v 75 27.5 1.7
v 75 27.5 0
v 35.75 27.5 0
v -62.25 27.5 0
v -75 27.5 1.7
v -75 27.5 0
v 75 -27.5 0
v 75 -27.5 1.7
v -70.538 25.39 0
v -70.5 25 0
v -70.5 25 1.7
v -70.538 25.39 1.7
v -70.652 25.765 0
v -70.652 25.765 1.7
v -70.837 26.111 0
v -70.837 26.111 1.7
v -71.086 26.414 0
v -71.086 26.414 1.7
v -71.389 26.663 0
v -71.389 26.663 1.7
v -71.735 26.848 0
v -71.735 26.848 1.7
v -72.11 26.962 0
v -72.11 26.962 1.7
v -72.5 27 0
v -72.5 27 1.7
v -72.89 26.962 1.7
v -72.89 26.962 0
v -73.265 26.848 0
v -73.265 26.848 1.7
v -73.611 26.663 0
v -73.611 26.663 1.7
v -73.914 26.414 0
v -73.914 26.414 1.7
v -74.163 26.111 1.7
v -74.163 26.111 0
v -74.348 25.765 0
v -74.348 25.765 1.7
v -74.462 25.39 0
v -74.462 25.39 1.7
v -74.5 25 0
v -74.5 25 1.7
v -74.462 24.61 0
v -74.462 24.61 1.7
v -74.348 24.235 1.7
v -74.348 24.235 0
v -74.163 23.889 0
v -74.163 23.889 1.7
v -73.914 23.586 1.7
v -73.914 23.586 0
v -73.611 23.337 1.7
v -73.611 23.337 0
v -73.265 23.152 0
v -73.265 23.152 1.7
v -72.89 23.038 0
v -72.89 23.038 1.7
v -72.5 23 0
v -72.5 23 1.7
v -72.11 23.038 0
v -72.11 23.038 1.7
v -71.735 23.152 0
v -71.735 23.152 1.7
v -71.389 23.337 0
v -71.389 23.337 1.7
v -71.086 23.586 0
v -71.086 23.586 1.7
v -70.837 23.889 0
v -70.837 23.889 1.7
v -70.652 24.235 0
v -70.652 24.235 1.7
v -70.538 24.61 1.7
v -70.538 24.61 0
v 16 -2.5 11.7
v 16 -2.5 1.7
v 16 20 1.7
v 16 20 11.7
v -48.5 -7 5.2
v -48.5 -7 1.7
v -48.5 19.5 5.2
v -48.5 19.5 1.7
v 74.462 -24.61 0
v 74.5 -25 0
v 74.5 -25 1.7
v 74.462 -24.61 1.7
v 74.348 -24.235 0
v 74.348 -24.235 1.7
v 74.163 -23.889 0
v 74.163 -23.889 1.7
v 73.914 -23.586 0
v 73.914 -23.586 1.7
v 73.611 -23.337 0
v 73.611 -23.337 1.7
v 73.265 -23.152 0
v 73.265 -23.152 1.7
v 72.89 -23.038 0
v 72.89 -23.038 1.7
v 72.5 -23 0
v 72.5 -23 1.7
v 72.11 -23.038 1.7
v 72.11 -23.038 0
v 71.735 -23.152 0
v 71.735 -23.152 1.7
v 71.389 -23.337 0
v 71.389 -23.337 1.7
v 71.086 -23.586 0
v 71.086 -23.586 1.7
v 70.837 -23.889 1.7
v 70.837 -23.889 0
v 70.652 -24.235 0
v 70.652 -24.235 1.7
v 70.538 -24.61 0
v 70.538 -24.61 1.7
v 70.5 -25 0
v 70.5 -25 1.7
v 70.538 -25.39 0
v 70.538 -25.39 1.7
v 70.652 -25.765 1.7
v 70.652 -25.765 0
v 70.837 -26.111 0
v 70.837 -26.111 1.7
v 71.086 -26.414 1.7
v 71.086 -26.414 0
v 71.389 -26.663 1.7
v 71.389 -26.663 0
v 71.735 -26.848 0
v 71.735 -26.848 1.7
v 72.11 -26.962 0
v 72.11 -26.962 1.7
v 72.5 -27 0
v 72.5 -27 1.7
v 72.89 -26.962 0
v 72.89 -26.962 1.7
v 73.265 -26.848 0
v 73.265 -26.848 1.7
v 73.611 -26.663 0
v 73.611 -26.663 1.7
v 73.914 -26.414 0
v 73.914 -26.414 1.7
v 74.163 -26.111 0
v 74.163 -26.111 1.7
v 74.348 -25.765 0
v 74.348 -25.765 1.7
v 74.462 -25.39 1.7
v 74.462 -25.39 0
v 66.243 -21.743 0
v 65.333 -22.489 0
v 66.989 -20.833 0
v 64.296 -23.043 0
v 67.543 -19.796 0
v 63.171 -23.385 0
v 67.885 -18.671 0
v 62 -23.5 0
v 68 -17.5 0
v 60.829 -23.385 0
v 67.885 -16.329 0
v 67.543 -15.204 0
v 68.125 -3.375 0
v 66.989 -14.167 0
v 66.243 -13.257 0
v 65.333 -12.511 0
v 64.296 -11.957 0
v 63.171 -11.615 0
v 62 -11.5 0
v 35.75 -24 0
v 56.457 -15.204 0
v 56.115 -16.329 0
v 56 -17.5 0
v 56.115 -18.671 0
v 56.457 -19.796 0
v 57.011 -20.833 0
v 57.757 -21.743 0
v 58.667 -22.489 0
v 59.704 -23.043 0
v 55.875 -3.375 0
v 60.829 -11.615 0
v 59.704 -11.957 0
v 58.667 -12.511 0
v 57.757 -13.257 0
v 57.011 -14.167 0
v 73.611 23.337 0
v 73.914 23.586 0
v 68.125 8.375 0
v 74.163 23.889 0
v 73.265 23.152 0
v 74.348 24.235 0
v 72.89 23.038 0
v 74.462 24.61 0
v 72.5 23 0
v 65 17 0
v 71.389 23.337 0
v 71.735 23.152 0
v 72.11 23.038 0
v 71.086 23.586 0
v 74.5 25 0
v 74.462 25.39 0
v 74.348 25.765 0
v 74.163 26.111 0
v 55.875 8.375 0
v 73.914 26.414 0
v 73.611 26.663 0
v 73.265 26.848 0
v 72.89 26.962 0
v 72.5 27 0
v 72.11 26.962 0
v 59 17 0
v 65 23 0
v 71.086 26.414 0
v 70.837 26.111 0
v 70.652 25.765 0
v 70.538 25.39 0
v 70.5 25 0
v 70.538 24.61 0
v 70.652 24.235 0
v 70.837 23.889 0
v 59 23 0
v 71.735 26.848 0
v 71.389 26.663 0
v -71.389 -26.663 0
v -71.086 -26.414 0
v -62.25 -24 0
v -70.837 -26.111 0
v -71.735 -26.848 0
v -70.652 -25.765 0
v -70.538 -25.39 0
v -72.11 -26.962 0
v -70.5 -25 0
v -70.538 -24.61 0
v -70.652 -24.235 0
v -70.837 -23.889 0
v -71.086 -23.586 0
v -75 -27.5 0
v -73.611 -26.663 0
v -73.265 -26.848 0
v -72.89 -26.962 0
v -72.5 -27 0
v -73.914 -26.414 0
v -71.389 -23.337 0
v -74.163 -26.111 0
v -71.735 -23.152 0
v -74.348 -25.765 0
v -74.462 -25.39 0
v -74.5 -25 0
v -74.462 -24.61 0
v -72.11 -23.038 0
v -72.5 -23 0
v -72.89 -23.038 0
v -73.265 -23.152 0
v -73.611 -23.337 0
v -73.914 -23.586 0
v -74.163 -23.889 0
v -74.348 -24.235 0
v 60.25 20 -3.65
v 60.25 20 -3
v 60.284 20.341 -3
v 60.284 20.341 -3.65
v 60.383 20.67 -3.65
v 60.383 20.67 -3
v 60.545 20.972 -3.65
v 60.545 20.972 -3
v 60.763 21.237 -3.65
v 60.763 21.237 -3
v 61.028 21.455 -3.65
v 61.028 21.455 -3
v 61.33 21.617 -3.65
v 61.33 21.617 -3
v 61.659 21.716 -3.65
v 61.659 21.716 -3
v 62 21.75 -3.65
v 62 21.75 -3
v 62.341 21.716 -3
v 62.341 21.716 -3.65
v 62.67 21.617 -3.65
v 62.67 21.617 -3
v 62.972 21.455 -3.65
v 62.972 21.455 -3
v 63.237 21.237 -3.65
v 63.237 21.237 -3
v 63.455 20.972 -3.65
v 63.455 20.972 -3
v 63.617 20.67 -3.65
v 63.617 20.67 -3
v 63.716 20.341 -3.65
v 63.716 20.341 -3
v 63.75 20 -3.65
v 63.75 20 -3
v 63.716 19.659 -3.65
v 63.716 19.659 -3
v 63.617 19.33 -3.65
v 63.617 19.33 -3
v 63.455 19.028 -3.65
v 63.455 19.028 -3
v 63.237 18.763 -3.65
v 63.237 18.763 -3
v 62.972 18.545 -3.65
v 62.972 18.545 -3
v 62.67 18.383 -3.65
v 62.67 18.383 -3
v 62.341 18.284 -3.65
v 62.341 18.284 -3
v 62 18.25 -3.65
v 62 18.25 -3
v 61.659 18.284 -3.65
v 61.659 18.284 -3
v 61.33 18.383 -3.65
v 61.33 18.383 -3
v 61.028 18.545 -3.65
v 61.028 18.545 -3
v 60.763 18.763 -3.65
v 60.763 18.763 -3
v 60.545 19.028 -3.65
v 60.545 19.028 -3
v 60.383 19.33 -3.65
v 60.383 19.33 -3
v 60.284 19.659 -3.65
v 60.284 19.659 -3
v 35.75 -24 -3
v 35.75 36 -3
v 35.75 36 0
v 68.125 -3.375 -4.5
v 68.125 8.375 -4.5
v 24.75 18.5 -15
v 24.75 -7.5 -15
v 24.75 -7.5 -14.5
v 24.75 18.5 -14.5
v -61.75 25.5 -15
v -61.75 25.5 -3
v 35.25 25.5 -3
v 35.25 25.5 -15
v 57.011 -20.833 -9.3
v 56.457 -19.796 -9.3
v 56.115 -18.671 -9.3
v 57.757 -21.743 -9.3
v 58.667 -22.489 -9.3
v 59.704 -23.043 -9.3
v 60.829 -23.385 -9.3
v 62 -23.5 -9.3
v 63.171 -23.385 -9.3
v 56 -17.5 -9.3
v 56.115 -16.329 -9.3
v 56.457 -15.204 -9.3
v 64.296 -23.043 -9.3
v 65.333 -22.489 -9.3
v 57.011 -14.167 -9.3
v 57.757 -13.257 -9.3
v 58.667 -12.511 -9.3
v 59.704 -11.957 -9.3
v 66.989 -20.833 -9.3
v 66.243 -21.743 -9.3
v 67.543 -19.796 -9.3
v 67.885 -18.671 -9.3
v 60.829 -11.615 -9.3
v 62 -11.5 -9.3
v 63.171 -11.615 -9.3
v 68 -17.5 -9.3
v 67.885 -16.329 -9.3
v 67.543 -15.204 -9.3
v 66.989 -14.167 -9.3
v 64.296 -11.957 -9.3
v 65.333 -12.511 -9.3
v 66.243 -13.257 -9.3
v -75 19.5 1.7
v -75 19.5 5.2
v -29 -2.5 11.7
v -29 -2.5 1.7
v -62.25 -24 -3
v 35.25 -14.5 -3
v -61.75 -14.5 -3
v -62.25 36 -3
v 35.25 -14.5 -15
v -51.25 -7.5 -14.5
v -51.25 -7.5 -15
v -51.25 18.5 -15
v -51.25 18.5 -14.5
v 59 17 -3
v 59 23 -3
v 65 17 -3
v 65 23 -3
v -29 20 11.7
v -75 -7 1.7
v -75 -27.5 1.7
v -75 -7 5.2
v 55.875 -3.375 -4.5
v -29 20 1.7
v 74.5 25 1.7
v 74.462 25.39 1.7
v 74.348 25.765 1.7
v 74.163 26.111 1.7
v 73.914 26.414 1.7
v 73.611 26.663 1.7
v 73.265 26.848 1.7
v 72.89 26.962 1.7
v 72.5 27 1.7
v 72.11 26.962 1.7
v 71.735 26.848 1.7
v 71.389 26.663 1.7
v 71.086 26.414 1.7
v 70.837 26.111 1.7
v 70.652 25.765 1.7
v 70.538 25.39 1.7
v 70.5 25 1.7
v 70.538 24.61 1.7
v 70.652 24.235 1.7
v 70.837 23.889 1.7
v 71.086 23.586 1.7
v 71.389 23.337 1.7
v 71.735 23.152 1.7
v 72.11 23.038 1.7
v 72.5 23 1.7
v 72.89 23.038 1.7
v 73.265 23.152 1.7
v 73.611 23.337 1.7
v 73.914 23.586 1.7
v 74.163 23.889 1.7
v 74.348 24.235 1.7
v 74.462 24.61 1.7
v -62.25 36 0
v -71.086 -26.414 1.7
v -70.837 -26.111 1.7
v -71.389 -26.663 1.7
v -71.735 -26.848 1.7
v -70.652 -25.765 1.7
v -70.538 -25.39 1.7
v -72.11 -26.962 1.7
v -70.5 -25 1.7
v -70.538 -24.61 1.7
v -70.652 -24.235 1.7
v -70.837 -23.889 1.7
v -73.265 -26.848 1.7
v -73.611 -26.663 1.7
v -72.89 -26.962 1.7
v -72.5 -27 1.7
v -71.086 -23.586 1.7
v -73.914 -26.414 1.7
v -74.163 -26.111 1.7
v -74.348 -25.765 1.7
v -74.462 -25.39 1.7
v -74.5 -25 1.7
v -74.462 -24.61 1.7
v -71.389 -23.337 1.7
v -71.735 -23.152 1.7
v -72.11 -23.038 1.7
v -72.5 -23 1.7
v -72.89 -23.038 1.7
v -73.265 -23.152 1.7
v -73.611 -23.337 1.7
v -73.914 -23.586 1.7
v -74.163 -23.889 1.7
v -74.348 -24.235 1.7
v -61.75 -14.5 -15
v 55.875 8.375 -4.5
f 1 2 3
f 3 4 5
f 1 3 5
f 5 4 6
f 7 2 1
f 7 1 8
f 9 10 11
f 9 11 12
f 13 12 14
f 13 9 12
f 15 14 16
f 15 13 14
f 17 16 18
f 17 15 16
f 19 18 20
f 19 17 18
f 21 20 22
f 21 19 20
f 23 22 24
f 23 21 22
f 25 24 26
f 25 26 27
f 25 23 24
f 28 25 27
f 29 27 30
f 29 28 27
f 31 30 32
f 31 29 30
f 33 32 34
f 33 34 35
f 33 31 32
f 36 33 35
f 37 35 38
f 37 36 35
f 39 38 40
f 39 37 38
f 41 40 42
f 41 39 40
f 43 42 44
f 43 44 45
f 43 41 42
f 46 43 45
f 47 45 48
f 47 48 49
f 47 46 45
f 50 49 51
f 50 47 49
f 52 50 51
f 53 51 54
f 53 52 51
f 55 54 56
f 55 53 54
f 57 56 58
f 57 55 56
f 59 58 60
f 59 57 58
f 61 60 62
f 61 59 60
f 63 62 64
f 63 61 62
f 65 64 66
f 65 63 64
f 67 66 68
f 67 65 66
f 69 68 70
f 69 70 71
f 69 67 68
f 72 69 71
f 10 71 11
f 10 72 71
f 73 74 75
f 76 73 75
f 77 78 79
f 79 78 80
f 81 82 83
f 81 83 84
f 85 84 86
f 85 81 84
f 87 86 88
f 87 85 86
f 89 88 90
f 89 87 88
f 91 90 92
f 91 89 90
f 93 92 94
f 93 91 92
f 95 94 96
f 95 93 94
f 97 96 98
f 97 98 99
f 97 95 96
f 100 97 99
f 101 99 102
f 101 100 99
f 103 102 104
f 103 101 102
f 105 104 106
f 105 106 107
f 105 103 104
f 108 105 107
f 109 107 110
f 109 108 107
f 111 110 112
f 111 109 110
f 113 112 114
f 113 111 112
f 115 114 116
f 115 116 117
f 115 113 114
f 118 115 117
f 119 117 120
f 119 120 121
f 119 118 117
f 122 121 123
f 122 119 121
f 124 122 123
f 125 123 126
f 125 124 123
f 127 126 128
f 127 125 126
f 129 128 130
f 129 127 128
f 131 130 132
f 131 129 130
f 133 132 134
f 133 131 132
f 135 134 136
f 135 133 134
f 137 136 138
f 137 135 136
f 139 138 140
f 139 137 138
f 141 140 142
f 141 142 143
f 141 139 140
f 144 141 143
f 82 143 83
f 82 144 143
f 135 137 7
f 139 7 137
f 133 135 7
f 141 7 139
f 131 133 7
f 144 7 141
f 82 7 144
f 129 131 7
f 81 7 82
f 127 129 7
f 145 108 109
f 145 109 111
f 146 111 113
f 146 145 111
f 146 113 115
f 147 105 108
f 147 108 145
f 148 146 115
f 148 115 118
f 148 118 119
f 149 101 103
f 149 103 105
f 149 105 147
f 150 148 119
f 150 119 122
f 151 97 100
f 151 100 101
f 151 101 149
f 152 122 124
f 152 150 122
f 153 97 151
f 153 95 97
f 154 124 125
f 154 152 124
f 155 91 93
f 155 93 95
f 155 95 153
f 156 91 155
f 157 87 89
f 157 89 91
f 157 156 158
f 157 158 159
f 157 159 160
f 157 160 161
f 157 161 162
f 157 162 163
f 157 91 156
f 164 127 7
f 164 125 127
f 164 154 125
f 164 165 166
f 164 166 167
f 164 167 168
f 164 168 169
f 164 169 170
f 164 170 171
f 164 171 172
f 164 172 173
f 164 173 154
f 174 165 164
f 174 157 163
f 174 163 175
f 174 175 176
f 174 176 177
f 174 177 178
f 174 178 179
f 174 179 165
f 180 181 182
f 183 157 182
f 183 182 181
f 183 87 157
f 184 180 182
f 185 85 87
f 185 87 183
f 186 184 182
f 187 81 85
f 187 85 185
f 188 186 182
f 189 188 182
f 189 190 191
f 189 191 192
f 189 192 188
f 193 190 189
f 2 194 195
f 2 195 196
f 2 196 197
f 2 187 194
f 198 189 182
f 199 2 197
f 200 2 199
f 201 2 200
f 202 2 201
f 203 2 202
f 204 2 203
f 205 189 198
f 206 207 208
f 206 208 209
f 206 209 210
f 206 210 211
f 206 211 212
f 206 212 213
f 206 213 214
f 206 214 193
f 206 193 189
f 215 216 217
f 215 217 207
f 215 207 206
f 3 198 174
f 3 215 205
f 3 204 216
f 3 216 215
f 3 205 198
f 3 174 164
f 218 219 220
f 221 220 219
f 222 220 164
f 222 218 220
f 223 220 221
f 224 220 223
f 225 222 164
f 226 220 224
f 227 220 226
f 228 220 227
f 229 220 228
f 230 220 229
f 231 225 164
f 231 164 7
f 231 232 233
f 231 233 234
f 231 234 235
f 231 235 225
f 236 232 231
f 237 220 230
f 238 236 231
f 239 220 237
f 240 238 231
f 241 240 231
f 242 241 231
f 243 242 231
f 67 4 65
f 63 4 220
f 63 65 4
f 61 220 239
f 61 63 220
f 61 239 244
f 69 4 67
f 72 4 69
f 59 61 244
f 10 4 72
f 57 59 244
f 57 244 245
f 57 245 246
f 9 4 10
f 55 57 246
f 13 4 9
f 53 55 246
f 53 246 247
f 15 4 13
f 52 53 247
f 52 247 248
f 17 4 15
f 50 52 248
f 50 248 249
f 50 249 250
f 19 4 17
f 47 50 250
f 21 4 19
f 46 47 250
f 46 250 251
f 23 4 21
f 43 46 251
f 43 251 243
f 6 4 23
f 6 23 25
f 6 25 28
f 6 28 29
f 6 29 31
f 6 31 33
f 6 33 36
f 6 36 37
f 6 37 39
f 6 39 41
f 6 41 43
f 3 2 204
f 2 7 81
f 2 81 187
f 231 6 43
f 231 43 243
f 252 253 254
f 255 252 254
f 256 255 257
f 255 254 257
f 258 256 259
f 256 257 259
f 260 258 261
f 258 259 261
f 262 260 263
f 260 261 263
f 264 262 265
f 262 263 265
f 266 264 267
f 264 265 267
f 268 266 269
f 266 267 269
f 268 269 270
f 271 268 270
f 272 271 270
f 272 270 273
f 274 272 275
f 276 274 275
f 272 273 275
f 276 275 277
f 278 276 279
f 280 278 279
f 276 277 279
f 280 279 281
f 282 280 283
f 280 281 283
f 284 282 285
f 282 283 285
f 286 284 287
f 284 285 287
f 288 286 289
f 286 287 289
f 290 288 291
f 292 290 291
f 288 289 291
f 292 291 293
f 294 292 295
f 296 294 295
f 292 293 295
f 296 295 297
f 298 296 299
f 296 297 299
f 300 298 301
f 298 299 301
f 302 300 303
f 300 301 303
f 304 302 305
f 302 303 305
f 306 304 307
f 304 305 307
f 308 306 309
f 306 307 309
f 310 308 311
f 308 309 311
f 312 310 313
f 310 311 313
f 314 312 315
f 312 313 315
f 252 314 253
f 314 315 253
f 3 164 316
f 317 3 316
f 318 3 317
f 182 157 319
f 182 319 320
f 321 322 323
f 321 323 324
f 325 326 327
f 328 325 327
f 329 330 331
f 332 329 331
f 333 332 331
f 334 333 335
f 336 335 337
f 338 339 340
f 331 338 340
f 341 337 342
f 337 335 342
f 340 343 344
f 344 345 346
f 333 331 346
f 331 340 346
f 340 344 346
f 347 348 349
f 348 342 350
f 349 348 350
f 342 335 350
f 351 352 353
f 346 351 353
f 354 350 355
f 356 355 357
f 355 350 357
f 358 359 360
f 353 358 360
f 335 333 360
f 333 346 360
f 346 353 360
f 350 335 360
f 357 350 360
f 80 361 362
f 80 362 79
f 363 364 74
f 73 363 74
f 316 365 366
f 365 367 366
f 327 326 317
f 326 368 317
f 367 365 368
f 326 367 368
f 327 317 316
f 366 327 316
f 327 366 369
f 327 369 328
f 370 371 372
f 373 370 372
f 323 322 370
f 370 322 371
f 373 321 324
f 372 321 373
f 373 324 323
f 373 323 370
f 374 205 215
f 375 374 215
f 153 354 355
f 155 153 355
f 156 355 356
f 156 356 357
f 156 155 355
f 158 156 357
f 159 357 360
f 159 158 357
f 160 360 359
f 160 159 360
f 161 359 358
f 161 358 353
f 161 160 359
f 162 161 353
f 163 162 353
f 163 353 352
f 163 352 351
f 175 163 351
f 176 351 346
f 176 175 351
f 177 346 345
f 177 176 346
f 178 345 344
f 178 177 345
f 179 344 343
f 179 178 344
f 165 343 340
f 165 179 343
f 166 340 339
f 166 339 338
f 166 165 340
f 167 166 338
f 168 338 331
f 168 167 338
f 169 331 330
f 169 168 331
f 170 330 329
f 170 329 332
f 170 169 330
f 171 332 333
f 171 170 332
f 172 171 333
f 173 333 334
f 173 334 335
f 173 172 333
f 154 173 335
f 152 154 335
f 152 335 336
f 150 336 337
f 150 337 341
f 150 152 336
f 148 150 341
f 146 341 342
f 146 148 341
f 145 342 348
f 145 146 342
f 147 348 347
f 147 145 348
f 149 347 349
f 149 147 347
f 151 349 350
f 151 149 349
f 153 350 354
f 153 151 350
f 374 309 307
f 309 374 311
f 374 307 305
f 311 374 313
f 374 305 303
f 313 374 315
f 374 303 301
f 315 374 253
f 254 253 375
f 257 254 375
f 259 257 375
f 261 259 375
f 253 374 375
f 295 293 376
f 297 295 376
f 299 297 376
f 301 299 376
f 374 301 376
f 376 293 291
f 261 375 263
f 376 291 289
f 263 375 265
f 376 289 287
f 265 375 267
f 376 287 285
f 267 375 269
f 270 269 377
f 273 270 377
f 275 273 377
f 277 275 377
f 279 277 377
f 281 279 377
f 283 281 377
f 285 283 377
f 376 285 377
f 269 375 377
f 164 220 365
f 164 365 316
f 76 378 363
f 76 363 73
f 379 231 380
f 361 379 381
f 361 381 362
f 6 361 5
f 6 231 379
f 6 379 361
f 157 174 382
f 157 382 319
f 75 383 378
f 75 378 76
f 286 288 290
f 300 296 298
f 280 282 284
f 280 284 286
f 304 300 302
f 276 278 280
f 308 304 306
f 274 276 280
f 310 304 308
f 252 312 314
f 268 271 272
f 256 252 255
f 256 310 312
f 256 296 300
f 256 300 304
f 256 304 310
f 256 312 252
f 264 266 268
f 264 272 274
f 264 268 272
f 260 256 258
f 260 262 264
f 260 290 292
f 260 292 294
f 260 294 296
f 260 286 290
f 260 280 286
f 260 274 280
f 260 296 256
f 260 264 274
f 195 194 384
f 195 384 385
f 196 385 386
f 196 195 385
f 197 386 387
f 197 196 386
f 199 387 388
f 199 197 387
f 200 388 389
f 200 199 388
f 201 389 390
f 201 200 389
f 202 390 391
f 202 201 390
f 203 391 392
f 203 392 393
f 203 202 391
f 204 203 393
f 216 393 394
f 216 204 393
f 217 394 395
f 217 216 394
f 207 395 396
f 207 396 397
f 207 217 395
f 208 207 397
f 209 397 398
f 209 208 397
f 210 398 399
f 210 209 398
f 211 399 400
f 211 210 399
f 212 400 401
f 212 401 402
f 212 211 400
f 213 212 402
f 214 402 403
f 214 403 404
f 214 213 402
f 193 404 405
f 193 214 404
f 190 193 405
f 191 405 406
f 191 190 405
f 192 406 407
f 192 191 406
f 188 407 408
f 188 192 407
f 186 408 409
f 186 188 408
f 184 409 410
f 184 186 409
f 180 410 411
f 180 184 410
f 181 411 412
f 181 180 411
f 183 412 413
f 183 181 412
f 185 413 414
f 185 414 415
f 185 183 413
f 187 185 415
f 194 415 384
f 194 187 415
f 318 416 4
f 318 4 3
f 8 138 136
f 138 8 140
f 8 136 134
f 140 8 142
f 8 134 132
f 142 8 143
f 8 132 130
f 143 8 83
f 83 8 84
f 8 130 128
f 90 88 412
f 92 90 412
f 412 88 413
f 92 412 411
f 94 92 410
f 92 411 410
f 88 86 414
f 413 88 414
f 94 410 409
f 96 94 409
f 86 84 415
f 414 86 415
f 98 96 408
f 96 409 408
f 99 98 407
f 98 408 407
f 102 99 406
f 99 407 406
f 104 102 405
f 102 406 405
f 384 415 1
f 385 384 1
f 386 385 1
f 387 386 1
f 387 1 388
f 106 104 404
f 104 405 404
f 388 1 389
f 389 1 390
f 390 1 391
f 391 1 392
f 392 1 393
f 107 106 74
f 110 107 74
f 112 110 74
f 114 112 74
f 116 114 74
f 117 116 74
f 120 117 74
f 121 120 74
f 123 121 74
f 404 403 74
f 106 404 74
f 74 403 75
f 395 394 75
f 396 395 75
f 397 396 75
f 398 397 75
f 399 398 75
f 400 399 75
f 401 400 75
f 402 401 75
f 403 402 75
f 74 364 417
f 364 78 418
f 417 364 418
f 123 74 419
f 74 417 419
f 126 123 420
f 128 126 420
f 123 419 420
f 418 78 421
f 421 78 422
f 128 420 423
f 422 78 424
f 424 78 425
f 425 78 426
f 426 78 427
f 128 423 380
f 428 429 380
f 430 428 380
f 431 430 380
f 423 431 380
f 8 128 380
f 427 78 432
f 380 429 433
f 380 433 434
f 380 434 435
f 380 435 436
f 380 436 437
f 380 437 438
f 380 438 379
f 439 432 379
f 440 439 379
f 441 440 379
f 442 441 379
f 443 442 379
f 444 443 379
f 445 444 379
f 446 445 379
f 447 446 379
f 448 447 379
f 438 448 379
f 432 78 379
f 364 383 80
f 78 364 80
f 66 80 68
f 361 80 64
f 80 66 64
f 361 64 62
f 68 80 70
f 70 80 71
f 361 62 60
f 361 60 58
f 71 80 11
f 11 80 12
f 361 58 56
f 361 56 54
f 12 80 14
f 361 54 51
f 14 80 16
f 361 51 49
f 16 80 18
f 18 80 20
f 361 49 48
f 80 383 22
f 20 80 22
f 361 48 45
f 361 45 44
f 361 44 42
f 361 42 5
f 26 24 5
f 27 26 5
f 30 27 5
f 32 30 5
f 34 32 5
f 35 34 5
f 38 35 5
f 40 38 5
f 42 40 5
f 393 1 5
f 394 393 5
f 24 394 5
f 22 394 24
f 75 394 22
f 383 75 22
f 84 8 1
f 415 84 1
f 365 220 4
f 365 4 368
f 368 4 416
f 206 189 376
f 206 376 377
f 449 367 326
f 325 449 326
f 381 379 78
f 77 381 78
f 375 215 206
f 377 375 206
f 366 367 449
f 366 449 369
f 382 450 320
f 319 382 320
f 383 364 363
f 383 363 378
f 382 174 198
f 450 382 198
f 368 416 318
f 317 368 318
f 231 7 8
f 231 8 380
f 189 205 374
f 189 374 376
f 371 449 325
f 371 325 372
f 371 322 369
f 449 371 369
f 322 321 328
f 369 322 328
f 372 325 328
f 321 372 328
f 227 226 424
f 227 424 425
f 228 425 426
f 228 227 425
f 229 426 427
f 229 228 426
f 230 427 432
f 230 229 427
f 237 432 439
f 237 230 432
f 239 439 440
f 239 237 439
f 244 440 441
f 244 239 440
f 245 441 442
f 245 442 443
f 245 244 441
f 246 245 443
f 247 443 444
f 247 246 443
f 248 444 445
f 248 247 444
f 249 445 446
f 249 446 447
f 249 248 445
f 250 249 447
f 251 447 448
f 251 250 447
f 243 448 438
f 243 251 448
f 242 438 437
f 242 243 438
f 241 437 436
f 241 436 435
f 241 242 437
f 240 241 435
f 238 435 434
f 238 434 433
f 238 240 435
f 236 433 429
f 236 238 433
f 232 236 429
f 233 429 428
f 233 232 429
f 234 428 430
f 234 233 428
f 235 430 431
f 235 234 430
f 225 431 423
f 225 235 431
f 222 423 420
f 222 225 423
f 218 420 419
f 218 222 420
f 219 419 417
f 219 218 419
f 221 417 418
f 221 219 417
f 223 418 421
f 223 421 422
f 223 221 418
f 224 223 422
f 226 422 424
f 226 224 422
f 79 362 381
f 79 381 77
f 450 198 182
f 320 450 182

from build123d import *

# Parameters (mm, degrees)
SKETCH2_R           = 2
BOSS_EXTRUDE1_DEPTH = 1.7
SKETCH3_W           = 98
SKETCH3_H           = 60
BOSS_EXTRUDE2_DEPTH = 3
SKETCH4_W           = 97
SKETCH4_H           = 40
BOSS_EXTRUDE3_DEPTH = 15
SKETCH5_W           = 6
SKETCH5_H           = 6
BOSS_EXTRUDE4_DEPTH = 3
SKETCH6_R           = 1.75
BOSS_EXTRUDE5_DEPTH = 0.65
SKETCH7_W           = 12.25
SKETCH7_H           = 11.75
BOSS_EXTRUDE6_DEPTH = 4.5
SKETCH8_R           = 6
BOSS_EXTRUDE7_DEPTH = 9.3
SKETCH9_W           = 45
SKETCH9_H           = 22.5
BOSS_EXTRUDE8_DEPTH = 10
SKETCH10_W          = 26.5
SKETCH10_H          = 26.5
BOSS_EXTRUDE9_DEPTH = 3.5
SKETCH11_W          = 76
SKETCH11_H          = 26
CUT_EXTRUDE1_DEPTH  = 0.5


with BuildPart() as part:
    # Sketch2 → Boss-Extrude1 (new body)
    with BuildSketch(Plane.XY):
        Polygon((75, 27.5), (75, -27.5), (-75, -27.5), (-75, 27.5), (-62.25, 27.5), (35.75, 27.5), align=None)
        with Locations((-72.5, -25)):
            Circle(SKETCH2_R, mode=Mode.SUBTRACT)
        with Locations((-72.5, 25)):
            Circle(SKETCH2_R, mode=Mode.SUBTRACT)
        with Locations((72.5, -25)):
            Circle(SKETCH2_R, mode=Mode.SUBTRACT)
        with Locations((72.5, 25)):
            Circle(SKETCH2_R, mode=Mode.SUBTRACT)
    extrude(amount=BOSS_EXTRUDE1_DEPTH)

    # Sketch3 → Boss-Extrude2 (add)
    with BuildSketch(Plane.XY):
        with Locations((-13.25, 6)):
            Rectangle(SKETCH3_W, SKETCH3_H)
    extrude(amount=-BOSS_EXTRUDE2_DEPTH)

    # Sketch4 → Boss-Extrude3 (add)
    with BuildSketch(Plane.XY):
        with Locations((-13.25, 5.5)):
            Rectangle(SKETCH4_W, SKETCH4_H)
    extrude(amount=-BOSS_EXTRUDE3_DEPTH)

    # Sketch5 → Boss-Extrude4 (add)
    with BuildSketch(Plane.XY):
        with Locations((62, 20)):
            Rectangle(SKETCH5_W, SKETCH5_H)
    extrude(amount=-BOSS_EXTRUDE4_DEPTH)

    # Sketch6 → Boss-Extrude5 (add)
    with BuildSketch(Plane(origin=(0, 0, -3), x_dir=(-1, 0, 0), z_dir=(0, 0, -1))):
        with Locations((-62, 20)):
            Circle(SKETCH6_R)
    extrude(amount=BOSS_EXTRUDE5_DEPTH)

    # Sketch7 → Boss-Extrude6 (add)
    with BuildSketch(Plane.XY):
        with Locations((62, 2.5)):
            Rectangle(SKETCH7_W, SKETCH7_H)
    extrude(amount=-BOSS_EXTRUDE6_DEPTH)

    # Sketch8 → Boss-Extrude7 (add)
    with BuildSketch(Plane.XY):
        with Locations((62, -17.5)):
            Circle(SKETCH8_R)
    extrude(amount=-BOSS_EXTRUDE7_DEPTH)

    # Sketch9 → Boss-Extrude8 (add)
    with BuildSketch(Plane.XY.offset(1.7)):
        with Locations((-6.5, 8.75)):
            Rectangle(SKETCH9_W, SKETCH9_H)
    extrude(amount=BOSS_EXTRUDE8_DEPTH)

    # Sketch10 → Boss-Extrude9 (add)
    with BuildSketch(Plane.XY.offset(1.7)):
        with Locations((-61.75, 6.25)):
            Rectangle(SKETCH10_W, SKETCH10_H)
    extrude(amount=BOSS_EXTRUDE9_DEPTH)

    # Sketch11 → Cut-Extrude1 (cut)
    with BuildSketch(Plane(origin=(0, 0, -15), x_dir=(-1, 0, 0), z_dir=(0, 0, -1))):
        with Locations((13.25, 5.5)):
            Rectangle(SKETCH11_W, SKETCH11_H)
    extrude(amount=-CUT_EXTRUDE1_DEPTH, mode=Mode.SUBTRACT)


solid = part.part
